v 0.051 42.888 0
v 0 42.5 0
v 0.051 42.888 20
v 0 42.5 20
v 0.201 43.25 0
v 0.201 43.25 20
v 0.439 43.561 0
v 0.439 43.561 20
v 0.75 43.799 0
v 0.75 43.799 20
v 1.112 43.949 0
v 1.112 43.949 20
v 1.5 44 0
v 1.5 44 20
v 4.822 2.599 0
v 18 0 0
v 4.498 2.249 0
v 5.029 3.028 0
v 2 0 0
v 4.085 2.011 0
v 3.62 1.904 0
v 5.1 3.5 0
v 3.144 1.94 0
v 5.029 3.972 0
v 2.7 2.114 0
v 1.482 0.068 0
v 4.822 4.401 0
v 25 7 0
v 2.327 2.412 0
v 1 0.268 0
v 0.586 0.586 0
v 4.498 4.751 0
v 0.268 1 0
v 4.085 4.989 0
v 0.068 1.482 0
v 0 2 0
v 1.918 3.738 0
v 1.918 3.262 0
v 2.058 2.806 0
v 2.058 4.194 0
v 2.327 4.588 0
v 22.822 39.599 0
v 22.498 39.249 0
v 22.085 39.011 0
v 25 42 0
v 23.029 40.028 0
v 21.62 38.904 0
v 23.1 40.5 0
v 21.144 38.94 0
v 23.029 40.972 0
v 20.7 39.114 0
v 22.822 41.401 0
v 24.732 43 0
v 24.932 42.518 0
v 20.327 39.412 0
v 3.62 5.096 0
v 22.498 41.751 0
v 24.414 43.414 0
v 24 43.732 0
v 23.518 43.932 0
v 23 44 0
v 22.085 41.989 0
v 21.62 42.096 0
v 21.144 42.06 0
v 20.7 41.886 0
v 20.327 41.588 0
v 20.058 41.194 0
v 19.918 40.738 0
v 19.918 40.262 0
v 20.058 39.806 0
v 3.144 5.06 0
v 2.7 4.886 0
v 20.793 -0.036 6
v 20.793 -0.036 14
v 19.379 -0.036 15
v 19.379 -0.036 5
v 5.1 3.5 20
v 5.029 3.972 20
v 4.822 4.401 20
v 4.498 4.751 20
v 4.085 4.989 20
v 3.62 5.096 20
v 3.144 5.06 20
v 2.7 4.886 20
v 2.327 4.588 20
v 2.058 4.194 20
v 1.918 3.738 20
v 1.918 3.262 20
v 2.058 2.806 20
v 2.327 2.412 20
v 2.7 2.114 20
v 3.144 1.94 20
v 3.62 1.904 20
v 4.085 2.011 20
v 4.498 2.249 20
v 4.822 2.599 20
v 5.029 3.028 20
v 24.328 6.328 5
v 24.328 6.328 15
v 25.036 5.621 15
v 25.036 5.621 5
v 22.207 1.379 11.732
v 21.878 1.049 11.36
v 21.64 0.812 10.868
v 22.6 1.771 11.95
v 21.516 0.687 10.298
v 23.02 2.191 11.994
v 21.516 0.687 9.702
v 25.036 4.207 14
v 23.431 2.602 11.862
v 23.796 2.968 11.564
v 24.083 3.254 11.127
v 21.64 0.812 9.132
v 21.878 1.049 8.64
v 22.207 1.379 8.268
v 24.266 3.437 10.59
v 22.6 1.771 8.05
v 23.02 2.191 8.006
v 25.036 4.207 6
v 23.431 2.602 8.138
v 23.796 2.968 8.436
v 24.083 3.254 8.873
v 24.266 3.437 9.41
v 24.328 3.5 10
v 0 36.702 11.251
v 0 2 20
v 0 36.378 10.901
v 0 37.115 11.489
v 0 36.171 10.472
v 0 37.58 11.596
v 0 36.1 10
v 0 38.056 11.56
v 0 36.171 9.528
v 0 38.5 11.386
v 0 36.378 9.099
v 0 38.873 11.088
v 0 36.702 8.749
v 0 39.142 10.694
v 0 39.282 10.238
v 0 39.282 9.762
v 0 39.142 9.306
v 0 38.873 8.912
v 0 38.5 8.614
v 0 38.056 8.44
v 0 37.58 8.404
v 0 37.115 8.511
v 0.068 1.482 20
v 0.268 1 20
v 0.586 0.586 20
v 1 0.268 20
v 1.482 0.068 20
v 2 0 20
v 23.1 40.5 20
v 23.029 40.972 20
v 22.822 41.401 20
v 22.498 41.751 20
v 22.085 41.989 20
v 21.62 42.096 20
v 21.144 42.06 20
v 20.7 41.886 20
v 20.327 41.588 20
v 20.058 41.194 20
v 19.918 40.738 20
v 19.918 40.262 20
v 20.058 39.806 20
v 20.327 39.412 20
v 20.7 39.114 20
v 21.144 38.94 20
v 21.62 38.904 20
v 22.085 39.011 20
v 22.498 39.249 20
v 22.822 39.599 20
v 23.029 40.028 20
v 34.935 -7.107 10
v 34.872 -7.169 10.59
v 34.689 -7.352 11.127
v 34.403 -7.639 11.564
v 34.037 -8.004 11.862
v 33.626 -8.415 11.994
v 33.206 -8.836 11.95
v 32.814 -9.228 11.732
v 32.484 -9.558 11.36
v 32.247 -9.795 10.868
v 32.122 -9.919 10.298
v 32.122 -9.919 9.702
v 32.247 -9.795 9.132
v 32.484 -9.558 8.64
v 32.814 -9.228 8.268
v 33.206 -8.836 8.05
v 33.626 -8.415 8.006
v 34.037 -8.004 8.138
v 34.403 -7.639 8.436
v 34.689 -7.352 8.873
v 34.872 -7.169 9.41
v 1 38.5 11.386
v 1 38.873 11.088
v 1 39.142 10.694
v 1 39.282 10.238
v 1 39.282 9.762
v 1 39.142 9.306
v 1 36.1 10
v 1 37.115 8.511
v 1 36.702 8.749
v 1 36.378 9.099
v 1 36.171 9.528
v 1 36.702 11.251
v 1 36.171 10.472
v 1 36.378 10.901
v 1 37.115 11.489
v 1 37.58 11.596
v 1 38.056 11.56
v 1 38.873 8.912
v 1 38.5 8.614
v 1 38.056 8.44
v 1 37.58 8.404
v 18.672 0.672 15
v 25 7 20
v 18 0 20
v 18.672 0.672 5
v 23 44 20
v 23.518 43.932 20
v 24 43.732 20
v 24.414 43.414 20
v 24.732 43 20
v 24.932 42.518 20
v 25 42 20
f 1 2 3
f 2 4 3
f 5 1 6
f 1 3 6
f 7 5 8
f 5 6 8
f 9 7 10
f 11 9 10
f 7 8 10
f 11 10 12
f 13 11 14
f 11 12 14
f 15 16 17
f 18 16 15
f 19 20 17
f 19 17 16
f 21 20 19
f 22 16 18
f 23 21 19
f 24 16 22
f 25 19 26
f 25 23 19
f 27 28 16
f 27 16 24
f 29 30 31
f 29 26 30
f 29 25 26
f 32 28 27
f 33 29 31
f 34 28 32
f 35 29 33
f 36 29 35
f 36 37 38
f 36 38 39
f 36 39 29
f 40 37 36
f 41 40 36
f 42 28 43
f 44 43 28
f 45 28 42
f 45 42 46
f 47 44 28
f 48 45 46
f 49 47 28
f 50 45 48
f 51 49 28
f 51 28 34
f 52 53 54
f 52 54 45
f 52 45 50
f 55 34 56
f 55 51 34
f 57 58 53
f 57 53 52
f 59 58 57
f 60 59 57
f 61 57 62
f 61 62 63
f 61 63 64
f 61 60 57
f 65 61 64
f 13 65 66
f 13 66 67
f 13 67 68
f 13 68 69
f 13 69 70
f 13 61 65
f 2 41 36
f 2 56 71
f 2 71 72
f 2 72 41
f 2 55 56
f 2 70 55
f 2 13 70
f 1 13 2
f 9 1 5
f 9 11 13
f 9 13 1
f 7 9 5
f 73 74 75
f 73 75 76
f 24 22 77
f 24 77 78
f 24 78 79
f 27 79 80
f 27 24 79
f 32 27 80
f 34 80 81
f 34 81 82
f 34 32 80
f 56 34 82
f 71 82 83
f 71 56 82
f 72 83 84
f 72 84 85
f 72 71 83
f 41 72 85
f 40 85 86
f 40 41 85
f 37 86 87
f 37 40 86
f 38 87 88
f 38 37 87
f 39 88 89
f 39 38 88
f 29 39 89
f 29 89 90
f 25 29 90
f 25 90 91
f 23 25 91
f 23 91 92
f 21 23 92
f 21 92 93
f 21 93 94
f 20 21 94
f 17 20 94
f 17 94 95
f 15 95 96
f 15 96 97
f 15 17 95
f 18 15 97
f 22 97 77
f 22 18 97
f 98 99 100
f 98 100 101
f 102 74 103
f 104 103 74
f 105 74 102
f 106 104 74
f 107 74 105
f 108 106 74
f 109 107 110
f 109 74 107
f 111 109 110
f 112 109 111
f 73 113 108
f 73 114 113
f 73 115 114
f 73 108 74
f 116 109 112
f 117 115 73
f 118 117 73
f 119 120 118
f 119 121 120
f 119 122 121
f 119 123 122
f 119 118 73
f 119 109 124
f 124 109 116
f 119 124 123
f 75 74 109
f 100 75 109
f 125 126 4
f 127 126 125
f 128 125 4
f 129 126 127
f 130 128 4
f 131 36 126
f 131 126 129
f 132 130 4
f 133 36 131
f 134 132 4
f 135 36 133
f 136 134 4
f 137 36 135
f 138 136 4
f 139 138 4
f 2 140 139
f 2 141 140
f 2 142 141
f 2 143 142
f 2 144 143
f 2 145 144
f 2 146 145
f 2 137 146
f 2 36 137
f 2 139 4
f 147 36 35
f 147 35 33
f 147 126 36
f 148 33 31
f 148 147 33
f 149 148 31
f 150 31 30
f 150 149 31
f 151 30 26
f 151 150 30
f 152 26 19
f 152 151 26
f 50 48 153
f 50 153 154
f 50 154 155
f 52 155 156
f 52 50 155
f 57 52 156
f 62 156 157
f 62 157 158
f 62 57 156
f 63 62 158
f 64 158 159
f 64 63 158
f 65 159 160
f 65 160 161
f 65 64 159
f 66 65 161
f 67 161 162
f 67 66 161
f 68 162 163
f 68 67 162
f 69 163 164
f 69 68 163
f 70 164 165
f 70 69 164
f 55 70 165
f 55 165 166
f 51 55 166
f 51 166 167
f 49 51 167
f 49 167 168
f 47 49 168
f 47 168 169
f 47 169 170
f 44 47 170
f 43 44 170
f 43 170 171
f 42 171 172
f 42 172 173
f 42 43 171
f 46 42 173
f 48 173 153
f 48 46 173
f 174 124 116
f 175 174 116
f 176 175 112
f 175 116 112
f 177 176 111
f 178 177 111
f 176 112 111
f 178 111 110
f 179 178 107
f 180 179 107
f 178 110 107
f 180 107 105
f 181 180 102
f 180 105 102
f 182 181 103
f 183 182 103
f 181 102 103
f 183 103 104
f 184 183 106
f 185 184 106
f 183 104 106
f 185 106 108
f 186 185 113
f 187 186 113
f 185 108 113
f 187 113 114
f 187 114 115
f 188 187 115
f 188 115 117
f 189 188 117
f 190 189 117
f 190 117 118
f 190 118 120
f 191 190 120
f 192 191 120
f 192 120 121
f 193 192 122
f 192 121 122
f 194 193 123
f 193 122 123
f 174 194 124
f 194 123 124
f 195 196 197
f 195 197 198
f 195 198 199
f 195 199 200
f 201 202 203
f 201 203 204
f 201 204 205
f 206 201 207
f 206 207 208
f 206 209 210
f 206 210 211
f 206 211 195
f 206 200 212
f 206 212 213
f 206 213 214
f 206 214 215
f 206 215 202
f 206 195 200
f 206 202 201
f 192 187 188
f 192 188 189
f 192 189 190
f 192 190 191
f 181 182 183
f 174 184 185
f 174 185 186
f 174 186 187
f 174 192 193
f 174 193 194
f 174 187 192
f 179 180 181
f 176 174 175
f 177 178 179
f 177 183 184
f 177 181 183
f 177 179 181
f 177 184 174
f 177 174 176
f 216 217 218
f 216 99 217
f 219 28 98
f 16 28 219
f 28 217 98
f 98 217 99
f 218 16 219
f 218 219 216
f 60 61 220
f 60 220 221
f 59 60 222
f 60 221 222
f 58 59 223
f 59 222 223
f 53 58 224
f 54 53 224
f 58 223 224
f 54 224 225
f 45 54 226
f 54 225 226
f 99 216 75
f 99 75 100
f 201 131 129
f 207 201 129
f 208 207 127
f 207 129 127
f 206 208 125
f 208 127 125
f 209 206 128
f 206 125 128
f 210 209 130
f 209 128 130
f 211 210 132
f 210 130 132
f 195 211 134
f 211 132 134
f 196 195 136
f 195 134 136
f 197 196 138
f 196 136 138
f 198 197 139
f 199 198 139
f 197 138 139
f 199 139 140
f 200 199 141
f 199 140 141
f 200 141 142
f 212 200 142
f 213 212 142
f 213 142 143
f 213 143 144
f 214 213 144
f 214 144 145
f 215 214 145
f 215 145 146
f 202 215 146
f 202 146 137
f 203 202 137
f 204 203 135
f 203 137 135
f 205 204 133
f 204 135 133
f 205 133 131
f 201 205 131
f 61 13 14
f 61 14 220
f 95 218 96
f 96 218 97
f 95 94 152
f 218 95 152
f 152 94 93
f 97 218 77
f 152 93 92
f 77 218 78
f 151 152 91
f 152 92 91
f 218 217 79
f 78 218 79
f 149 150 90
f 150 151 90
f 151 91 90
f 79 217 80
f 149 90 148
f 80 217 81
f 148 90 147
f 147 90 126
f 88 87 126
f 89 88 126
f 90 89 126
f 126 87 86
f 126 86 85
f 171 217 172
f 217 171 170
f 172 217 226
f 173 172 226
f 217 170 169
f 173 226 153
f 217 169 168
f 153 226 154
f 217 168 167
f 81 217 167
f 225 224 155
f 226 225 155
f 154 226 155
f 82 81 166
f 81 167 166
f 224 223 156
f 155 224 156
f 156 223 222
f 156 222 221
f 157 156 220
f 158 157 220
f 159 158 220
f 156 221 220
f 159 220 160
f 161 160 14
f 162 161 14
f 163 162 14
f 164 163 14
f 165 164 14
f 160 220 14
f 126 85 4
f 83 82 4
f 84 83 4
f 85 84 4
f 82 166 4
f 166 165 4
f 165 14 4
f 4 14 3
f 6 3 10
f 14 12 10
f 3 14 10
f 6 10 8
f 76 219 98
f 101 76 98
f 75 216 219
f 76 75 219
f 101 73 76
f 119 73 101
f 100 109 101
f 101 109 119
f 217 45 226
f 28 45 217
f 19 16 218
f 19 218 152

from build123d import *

# Parameters (mm, degrees)
SKETCH_1_R          = 1.6
EXTRUDE_1_DEPTH     = 20
SKETCH_2_R          = 1.6
CUT_EXTRUDE_1_DEPTH = 1
FILLET_1_R          = 1.5
FILLET_2_R          = 2
SKETCH_3_W          = 10
SKETCH_3_H          = 8
EXTRUDE_2_DEPTH     = 2
CHAMFER_1_SIZE      = 1
SKETCH_4_R          = 2
EXTRUDE_3_DEPTH     = 15


with BuildPart() as part:
    # 草图1 → 凸台-拉伸1 (new body)
    with BuildSketch(Plane.XY):
        Polygon((0, 0), (0, 44), (25, 44), (25, 7), (18, 0), align=None)
        with Locations((21.5, 40.5)):
            Circle(SKETCH_1_R, mode=Mode.SUBTRACT)
        with Locations((3.5, 3.5)):
            Circle(SKETCH_1_R, mode=Mode.SUBTRACT)
    extrude(amount=EXTRUDE_1_DEPTH)

    # 草图2 → 切除-拉伸1 (cut)
    with BuildSketch(Plane.ZY):
        with Locations(Location((10, 37.7, 0), (0, 0, 270))):
            Circle(SKETCH_2_R)
    extrude(amount=-CUT_EXTRUDE_1_DEPTH, mode=Mode.SUBTRACT)

    # 圆角1
    fillet_1_edges = [part.edges().sort_by_distance(p)[0] for p in [
        (0, 44, 10),
    ]]
    fillet(fillet_1_edges, radius=FILLET_1_R)

    # 圆角2
    fillet_2_edges = [part.edges().sort_by_distance(p)[0] for p in [
        (0, 0, 10),
        (25, 44, 10),
    ]]
    fillet(fillet_2_edges, radius=FILLET_2_R)

    # 草图3 → 凸台-拉伸2 (add)
    with BuildSketch(Plane(origin=(9, -9, 0), x_dir=(0, 0, -1), z_dir=(0.7071067811865487, -0.7071067811865464, 0))):
        with Locations((-10, 17.67766953)):
            Rectangle(SKETCH_3_W, SKETCH_3_H)
    extrude(amount=EXTRUDE_2_DEPTH)

    # 倒角1
    chamfer_1_edges = [part.edges().sort_by_distance(p)[0] for p in [
        (22.914213562, 2.085786438, 5),
        (25.742640687, 4.914213562, 10),
        (22.914213562, 2.085786438, 15),
        (20.085786438, -0.742640687, 10),
    ]]
    chamfer(chamfer_1_edges, length=CHAMFER_1_SIZE)

    # 草图4 → 凸台-拉伸3 (add)
    with BuildSketch(Plane(origin=(10.414213562, -10.414213562, 0), x_dir=(0, 0, -1), z_dir=(0.7071067811865485, -0.7071067811865467, 0))):
        with Locations(Location((-10, 17.67766953, 0), (0, 0, 90))):
            Circle(SKETCH_4_R)
    extrude(amount=EXTRUDE_3_DEPTH)


solid = part.part
